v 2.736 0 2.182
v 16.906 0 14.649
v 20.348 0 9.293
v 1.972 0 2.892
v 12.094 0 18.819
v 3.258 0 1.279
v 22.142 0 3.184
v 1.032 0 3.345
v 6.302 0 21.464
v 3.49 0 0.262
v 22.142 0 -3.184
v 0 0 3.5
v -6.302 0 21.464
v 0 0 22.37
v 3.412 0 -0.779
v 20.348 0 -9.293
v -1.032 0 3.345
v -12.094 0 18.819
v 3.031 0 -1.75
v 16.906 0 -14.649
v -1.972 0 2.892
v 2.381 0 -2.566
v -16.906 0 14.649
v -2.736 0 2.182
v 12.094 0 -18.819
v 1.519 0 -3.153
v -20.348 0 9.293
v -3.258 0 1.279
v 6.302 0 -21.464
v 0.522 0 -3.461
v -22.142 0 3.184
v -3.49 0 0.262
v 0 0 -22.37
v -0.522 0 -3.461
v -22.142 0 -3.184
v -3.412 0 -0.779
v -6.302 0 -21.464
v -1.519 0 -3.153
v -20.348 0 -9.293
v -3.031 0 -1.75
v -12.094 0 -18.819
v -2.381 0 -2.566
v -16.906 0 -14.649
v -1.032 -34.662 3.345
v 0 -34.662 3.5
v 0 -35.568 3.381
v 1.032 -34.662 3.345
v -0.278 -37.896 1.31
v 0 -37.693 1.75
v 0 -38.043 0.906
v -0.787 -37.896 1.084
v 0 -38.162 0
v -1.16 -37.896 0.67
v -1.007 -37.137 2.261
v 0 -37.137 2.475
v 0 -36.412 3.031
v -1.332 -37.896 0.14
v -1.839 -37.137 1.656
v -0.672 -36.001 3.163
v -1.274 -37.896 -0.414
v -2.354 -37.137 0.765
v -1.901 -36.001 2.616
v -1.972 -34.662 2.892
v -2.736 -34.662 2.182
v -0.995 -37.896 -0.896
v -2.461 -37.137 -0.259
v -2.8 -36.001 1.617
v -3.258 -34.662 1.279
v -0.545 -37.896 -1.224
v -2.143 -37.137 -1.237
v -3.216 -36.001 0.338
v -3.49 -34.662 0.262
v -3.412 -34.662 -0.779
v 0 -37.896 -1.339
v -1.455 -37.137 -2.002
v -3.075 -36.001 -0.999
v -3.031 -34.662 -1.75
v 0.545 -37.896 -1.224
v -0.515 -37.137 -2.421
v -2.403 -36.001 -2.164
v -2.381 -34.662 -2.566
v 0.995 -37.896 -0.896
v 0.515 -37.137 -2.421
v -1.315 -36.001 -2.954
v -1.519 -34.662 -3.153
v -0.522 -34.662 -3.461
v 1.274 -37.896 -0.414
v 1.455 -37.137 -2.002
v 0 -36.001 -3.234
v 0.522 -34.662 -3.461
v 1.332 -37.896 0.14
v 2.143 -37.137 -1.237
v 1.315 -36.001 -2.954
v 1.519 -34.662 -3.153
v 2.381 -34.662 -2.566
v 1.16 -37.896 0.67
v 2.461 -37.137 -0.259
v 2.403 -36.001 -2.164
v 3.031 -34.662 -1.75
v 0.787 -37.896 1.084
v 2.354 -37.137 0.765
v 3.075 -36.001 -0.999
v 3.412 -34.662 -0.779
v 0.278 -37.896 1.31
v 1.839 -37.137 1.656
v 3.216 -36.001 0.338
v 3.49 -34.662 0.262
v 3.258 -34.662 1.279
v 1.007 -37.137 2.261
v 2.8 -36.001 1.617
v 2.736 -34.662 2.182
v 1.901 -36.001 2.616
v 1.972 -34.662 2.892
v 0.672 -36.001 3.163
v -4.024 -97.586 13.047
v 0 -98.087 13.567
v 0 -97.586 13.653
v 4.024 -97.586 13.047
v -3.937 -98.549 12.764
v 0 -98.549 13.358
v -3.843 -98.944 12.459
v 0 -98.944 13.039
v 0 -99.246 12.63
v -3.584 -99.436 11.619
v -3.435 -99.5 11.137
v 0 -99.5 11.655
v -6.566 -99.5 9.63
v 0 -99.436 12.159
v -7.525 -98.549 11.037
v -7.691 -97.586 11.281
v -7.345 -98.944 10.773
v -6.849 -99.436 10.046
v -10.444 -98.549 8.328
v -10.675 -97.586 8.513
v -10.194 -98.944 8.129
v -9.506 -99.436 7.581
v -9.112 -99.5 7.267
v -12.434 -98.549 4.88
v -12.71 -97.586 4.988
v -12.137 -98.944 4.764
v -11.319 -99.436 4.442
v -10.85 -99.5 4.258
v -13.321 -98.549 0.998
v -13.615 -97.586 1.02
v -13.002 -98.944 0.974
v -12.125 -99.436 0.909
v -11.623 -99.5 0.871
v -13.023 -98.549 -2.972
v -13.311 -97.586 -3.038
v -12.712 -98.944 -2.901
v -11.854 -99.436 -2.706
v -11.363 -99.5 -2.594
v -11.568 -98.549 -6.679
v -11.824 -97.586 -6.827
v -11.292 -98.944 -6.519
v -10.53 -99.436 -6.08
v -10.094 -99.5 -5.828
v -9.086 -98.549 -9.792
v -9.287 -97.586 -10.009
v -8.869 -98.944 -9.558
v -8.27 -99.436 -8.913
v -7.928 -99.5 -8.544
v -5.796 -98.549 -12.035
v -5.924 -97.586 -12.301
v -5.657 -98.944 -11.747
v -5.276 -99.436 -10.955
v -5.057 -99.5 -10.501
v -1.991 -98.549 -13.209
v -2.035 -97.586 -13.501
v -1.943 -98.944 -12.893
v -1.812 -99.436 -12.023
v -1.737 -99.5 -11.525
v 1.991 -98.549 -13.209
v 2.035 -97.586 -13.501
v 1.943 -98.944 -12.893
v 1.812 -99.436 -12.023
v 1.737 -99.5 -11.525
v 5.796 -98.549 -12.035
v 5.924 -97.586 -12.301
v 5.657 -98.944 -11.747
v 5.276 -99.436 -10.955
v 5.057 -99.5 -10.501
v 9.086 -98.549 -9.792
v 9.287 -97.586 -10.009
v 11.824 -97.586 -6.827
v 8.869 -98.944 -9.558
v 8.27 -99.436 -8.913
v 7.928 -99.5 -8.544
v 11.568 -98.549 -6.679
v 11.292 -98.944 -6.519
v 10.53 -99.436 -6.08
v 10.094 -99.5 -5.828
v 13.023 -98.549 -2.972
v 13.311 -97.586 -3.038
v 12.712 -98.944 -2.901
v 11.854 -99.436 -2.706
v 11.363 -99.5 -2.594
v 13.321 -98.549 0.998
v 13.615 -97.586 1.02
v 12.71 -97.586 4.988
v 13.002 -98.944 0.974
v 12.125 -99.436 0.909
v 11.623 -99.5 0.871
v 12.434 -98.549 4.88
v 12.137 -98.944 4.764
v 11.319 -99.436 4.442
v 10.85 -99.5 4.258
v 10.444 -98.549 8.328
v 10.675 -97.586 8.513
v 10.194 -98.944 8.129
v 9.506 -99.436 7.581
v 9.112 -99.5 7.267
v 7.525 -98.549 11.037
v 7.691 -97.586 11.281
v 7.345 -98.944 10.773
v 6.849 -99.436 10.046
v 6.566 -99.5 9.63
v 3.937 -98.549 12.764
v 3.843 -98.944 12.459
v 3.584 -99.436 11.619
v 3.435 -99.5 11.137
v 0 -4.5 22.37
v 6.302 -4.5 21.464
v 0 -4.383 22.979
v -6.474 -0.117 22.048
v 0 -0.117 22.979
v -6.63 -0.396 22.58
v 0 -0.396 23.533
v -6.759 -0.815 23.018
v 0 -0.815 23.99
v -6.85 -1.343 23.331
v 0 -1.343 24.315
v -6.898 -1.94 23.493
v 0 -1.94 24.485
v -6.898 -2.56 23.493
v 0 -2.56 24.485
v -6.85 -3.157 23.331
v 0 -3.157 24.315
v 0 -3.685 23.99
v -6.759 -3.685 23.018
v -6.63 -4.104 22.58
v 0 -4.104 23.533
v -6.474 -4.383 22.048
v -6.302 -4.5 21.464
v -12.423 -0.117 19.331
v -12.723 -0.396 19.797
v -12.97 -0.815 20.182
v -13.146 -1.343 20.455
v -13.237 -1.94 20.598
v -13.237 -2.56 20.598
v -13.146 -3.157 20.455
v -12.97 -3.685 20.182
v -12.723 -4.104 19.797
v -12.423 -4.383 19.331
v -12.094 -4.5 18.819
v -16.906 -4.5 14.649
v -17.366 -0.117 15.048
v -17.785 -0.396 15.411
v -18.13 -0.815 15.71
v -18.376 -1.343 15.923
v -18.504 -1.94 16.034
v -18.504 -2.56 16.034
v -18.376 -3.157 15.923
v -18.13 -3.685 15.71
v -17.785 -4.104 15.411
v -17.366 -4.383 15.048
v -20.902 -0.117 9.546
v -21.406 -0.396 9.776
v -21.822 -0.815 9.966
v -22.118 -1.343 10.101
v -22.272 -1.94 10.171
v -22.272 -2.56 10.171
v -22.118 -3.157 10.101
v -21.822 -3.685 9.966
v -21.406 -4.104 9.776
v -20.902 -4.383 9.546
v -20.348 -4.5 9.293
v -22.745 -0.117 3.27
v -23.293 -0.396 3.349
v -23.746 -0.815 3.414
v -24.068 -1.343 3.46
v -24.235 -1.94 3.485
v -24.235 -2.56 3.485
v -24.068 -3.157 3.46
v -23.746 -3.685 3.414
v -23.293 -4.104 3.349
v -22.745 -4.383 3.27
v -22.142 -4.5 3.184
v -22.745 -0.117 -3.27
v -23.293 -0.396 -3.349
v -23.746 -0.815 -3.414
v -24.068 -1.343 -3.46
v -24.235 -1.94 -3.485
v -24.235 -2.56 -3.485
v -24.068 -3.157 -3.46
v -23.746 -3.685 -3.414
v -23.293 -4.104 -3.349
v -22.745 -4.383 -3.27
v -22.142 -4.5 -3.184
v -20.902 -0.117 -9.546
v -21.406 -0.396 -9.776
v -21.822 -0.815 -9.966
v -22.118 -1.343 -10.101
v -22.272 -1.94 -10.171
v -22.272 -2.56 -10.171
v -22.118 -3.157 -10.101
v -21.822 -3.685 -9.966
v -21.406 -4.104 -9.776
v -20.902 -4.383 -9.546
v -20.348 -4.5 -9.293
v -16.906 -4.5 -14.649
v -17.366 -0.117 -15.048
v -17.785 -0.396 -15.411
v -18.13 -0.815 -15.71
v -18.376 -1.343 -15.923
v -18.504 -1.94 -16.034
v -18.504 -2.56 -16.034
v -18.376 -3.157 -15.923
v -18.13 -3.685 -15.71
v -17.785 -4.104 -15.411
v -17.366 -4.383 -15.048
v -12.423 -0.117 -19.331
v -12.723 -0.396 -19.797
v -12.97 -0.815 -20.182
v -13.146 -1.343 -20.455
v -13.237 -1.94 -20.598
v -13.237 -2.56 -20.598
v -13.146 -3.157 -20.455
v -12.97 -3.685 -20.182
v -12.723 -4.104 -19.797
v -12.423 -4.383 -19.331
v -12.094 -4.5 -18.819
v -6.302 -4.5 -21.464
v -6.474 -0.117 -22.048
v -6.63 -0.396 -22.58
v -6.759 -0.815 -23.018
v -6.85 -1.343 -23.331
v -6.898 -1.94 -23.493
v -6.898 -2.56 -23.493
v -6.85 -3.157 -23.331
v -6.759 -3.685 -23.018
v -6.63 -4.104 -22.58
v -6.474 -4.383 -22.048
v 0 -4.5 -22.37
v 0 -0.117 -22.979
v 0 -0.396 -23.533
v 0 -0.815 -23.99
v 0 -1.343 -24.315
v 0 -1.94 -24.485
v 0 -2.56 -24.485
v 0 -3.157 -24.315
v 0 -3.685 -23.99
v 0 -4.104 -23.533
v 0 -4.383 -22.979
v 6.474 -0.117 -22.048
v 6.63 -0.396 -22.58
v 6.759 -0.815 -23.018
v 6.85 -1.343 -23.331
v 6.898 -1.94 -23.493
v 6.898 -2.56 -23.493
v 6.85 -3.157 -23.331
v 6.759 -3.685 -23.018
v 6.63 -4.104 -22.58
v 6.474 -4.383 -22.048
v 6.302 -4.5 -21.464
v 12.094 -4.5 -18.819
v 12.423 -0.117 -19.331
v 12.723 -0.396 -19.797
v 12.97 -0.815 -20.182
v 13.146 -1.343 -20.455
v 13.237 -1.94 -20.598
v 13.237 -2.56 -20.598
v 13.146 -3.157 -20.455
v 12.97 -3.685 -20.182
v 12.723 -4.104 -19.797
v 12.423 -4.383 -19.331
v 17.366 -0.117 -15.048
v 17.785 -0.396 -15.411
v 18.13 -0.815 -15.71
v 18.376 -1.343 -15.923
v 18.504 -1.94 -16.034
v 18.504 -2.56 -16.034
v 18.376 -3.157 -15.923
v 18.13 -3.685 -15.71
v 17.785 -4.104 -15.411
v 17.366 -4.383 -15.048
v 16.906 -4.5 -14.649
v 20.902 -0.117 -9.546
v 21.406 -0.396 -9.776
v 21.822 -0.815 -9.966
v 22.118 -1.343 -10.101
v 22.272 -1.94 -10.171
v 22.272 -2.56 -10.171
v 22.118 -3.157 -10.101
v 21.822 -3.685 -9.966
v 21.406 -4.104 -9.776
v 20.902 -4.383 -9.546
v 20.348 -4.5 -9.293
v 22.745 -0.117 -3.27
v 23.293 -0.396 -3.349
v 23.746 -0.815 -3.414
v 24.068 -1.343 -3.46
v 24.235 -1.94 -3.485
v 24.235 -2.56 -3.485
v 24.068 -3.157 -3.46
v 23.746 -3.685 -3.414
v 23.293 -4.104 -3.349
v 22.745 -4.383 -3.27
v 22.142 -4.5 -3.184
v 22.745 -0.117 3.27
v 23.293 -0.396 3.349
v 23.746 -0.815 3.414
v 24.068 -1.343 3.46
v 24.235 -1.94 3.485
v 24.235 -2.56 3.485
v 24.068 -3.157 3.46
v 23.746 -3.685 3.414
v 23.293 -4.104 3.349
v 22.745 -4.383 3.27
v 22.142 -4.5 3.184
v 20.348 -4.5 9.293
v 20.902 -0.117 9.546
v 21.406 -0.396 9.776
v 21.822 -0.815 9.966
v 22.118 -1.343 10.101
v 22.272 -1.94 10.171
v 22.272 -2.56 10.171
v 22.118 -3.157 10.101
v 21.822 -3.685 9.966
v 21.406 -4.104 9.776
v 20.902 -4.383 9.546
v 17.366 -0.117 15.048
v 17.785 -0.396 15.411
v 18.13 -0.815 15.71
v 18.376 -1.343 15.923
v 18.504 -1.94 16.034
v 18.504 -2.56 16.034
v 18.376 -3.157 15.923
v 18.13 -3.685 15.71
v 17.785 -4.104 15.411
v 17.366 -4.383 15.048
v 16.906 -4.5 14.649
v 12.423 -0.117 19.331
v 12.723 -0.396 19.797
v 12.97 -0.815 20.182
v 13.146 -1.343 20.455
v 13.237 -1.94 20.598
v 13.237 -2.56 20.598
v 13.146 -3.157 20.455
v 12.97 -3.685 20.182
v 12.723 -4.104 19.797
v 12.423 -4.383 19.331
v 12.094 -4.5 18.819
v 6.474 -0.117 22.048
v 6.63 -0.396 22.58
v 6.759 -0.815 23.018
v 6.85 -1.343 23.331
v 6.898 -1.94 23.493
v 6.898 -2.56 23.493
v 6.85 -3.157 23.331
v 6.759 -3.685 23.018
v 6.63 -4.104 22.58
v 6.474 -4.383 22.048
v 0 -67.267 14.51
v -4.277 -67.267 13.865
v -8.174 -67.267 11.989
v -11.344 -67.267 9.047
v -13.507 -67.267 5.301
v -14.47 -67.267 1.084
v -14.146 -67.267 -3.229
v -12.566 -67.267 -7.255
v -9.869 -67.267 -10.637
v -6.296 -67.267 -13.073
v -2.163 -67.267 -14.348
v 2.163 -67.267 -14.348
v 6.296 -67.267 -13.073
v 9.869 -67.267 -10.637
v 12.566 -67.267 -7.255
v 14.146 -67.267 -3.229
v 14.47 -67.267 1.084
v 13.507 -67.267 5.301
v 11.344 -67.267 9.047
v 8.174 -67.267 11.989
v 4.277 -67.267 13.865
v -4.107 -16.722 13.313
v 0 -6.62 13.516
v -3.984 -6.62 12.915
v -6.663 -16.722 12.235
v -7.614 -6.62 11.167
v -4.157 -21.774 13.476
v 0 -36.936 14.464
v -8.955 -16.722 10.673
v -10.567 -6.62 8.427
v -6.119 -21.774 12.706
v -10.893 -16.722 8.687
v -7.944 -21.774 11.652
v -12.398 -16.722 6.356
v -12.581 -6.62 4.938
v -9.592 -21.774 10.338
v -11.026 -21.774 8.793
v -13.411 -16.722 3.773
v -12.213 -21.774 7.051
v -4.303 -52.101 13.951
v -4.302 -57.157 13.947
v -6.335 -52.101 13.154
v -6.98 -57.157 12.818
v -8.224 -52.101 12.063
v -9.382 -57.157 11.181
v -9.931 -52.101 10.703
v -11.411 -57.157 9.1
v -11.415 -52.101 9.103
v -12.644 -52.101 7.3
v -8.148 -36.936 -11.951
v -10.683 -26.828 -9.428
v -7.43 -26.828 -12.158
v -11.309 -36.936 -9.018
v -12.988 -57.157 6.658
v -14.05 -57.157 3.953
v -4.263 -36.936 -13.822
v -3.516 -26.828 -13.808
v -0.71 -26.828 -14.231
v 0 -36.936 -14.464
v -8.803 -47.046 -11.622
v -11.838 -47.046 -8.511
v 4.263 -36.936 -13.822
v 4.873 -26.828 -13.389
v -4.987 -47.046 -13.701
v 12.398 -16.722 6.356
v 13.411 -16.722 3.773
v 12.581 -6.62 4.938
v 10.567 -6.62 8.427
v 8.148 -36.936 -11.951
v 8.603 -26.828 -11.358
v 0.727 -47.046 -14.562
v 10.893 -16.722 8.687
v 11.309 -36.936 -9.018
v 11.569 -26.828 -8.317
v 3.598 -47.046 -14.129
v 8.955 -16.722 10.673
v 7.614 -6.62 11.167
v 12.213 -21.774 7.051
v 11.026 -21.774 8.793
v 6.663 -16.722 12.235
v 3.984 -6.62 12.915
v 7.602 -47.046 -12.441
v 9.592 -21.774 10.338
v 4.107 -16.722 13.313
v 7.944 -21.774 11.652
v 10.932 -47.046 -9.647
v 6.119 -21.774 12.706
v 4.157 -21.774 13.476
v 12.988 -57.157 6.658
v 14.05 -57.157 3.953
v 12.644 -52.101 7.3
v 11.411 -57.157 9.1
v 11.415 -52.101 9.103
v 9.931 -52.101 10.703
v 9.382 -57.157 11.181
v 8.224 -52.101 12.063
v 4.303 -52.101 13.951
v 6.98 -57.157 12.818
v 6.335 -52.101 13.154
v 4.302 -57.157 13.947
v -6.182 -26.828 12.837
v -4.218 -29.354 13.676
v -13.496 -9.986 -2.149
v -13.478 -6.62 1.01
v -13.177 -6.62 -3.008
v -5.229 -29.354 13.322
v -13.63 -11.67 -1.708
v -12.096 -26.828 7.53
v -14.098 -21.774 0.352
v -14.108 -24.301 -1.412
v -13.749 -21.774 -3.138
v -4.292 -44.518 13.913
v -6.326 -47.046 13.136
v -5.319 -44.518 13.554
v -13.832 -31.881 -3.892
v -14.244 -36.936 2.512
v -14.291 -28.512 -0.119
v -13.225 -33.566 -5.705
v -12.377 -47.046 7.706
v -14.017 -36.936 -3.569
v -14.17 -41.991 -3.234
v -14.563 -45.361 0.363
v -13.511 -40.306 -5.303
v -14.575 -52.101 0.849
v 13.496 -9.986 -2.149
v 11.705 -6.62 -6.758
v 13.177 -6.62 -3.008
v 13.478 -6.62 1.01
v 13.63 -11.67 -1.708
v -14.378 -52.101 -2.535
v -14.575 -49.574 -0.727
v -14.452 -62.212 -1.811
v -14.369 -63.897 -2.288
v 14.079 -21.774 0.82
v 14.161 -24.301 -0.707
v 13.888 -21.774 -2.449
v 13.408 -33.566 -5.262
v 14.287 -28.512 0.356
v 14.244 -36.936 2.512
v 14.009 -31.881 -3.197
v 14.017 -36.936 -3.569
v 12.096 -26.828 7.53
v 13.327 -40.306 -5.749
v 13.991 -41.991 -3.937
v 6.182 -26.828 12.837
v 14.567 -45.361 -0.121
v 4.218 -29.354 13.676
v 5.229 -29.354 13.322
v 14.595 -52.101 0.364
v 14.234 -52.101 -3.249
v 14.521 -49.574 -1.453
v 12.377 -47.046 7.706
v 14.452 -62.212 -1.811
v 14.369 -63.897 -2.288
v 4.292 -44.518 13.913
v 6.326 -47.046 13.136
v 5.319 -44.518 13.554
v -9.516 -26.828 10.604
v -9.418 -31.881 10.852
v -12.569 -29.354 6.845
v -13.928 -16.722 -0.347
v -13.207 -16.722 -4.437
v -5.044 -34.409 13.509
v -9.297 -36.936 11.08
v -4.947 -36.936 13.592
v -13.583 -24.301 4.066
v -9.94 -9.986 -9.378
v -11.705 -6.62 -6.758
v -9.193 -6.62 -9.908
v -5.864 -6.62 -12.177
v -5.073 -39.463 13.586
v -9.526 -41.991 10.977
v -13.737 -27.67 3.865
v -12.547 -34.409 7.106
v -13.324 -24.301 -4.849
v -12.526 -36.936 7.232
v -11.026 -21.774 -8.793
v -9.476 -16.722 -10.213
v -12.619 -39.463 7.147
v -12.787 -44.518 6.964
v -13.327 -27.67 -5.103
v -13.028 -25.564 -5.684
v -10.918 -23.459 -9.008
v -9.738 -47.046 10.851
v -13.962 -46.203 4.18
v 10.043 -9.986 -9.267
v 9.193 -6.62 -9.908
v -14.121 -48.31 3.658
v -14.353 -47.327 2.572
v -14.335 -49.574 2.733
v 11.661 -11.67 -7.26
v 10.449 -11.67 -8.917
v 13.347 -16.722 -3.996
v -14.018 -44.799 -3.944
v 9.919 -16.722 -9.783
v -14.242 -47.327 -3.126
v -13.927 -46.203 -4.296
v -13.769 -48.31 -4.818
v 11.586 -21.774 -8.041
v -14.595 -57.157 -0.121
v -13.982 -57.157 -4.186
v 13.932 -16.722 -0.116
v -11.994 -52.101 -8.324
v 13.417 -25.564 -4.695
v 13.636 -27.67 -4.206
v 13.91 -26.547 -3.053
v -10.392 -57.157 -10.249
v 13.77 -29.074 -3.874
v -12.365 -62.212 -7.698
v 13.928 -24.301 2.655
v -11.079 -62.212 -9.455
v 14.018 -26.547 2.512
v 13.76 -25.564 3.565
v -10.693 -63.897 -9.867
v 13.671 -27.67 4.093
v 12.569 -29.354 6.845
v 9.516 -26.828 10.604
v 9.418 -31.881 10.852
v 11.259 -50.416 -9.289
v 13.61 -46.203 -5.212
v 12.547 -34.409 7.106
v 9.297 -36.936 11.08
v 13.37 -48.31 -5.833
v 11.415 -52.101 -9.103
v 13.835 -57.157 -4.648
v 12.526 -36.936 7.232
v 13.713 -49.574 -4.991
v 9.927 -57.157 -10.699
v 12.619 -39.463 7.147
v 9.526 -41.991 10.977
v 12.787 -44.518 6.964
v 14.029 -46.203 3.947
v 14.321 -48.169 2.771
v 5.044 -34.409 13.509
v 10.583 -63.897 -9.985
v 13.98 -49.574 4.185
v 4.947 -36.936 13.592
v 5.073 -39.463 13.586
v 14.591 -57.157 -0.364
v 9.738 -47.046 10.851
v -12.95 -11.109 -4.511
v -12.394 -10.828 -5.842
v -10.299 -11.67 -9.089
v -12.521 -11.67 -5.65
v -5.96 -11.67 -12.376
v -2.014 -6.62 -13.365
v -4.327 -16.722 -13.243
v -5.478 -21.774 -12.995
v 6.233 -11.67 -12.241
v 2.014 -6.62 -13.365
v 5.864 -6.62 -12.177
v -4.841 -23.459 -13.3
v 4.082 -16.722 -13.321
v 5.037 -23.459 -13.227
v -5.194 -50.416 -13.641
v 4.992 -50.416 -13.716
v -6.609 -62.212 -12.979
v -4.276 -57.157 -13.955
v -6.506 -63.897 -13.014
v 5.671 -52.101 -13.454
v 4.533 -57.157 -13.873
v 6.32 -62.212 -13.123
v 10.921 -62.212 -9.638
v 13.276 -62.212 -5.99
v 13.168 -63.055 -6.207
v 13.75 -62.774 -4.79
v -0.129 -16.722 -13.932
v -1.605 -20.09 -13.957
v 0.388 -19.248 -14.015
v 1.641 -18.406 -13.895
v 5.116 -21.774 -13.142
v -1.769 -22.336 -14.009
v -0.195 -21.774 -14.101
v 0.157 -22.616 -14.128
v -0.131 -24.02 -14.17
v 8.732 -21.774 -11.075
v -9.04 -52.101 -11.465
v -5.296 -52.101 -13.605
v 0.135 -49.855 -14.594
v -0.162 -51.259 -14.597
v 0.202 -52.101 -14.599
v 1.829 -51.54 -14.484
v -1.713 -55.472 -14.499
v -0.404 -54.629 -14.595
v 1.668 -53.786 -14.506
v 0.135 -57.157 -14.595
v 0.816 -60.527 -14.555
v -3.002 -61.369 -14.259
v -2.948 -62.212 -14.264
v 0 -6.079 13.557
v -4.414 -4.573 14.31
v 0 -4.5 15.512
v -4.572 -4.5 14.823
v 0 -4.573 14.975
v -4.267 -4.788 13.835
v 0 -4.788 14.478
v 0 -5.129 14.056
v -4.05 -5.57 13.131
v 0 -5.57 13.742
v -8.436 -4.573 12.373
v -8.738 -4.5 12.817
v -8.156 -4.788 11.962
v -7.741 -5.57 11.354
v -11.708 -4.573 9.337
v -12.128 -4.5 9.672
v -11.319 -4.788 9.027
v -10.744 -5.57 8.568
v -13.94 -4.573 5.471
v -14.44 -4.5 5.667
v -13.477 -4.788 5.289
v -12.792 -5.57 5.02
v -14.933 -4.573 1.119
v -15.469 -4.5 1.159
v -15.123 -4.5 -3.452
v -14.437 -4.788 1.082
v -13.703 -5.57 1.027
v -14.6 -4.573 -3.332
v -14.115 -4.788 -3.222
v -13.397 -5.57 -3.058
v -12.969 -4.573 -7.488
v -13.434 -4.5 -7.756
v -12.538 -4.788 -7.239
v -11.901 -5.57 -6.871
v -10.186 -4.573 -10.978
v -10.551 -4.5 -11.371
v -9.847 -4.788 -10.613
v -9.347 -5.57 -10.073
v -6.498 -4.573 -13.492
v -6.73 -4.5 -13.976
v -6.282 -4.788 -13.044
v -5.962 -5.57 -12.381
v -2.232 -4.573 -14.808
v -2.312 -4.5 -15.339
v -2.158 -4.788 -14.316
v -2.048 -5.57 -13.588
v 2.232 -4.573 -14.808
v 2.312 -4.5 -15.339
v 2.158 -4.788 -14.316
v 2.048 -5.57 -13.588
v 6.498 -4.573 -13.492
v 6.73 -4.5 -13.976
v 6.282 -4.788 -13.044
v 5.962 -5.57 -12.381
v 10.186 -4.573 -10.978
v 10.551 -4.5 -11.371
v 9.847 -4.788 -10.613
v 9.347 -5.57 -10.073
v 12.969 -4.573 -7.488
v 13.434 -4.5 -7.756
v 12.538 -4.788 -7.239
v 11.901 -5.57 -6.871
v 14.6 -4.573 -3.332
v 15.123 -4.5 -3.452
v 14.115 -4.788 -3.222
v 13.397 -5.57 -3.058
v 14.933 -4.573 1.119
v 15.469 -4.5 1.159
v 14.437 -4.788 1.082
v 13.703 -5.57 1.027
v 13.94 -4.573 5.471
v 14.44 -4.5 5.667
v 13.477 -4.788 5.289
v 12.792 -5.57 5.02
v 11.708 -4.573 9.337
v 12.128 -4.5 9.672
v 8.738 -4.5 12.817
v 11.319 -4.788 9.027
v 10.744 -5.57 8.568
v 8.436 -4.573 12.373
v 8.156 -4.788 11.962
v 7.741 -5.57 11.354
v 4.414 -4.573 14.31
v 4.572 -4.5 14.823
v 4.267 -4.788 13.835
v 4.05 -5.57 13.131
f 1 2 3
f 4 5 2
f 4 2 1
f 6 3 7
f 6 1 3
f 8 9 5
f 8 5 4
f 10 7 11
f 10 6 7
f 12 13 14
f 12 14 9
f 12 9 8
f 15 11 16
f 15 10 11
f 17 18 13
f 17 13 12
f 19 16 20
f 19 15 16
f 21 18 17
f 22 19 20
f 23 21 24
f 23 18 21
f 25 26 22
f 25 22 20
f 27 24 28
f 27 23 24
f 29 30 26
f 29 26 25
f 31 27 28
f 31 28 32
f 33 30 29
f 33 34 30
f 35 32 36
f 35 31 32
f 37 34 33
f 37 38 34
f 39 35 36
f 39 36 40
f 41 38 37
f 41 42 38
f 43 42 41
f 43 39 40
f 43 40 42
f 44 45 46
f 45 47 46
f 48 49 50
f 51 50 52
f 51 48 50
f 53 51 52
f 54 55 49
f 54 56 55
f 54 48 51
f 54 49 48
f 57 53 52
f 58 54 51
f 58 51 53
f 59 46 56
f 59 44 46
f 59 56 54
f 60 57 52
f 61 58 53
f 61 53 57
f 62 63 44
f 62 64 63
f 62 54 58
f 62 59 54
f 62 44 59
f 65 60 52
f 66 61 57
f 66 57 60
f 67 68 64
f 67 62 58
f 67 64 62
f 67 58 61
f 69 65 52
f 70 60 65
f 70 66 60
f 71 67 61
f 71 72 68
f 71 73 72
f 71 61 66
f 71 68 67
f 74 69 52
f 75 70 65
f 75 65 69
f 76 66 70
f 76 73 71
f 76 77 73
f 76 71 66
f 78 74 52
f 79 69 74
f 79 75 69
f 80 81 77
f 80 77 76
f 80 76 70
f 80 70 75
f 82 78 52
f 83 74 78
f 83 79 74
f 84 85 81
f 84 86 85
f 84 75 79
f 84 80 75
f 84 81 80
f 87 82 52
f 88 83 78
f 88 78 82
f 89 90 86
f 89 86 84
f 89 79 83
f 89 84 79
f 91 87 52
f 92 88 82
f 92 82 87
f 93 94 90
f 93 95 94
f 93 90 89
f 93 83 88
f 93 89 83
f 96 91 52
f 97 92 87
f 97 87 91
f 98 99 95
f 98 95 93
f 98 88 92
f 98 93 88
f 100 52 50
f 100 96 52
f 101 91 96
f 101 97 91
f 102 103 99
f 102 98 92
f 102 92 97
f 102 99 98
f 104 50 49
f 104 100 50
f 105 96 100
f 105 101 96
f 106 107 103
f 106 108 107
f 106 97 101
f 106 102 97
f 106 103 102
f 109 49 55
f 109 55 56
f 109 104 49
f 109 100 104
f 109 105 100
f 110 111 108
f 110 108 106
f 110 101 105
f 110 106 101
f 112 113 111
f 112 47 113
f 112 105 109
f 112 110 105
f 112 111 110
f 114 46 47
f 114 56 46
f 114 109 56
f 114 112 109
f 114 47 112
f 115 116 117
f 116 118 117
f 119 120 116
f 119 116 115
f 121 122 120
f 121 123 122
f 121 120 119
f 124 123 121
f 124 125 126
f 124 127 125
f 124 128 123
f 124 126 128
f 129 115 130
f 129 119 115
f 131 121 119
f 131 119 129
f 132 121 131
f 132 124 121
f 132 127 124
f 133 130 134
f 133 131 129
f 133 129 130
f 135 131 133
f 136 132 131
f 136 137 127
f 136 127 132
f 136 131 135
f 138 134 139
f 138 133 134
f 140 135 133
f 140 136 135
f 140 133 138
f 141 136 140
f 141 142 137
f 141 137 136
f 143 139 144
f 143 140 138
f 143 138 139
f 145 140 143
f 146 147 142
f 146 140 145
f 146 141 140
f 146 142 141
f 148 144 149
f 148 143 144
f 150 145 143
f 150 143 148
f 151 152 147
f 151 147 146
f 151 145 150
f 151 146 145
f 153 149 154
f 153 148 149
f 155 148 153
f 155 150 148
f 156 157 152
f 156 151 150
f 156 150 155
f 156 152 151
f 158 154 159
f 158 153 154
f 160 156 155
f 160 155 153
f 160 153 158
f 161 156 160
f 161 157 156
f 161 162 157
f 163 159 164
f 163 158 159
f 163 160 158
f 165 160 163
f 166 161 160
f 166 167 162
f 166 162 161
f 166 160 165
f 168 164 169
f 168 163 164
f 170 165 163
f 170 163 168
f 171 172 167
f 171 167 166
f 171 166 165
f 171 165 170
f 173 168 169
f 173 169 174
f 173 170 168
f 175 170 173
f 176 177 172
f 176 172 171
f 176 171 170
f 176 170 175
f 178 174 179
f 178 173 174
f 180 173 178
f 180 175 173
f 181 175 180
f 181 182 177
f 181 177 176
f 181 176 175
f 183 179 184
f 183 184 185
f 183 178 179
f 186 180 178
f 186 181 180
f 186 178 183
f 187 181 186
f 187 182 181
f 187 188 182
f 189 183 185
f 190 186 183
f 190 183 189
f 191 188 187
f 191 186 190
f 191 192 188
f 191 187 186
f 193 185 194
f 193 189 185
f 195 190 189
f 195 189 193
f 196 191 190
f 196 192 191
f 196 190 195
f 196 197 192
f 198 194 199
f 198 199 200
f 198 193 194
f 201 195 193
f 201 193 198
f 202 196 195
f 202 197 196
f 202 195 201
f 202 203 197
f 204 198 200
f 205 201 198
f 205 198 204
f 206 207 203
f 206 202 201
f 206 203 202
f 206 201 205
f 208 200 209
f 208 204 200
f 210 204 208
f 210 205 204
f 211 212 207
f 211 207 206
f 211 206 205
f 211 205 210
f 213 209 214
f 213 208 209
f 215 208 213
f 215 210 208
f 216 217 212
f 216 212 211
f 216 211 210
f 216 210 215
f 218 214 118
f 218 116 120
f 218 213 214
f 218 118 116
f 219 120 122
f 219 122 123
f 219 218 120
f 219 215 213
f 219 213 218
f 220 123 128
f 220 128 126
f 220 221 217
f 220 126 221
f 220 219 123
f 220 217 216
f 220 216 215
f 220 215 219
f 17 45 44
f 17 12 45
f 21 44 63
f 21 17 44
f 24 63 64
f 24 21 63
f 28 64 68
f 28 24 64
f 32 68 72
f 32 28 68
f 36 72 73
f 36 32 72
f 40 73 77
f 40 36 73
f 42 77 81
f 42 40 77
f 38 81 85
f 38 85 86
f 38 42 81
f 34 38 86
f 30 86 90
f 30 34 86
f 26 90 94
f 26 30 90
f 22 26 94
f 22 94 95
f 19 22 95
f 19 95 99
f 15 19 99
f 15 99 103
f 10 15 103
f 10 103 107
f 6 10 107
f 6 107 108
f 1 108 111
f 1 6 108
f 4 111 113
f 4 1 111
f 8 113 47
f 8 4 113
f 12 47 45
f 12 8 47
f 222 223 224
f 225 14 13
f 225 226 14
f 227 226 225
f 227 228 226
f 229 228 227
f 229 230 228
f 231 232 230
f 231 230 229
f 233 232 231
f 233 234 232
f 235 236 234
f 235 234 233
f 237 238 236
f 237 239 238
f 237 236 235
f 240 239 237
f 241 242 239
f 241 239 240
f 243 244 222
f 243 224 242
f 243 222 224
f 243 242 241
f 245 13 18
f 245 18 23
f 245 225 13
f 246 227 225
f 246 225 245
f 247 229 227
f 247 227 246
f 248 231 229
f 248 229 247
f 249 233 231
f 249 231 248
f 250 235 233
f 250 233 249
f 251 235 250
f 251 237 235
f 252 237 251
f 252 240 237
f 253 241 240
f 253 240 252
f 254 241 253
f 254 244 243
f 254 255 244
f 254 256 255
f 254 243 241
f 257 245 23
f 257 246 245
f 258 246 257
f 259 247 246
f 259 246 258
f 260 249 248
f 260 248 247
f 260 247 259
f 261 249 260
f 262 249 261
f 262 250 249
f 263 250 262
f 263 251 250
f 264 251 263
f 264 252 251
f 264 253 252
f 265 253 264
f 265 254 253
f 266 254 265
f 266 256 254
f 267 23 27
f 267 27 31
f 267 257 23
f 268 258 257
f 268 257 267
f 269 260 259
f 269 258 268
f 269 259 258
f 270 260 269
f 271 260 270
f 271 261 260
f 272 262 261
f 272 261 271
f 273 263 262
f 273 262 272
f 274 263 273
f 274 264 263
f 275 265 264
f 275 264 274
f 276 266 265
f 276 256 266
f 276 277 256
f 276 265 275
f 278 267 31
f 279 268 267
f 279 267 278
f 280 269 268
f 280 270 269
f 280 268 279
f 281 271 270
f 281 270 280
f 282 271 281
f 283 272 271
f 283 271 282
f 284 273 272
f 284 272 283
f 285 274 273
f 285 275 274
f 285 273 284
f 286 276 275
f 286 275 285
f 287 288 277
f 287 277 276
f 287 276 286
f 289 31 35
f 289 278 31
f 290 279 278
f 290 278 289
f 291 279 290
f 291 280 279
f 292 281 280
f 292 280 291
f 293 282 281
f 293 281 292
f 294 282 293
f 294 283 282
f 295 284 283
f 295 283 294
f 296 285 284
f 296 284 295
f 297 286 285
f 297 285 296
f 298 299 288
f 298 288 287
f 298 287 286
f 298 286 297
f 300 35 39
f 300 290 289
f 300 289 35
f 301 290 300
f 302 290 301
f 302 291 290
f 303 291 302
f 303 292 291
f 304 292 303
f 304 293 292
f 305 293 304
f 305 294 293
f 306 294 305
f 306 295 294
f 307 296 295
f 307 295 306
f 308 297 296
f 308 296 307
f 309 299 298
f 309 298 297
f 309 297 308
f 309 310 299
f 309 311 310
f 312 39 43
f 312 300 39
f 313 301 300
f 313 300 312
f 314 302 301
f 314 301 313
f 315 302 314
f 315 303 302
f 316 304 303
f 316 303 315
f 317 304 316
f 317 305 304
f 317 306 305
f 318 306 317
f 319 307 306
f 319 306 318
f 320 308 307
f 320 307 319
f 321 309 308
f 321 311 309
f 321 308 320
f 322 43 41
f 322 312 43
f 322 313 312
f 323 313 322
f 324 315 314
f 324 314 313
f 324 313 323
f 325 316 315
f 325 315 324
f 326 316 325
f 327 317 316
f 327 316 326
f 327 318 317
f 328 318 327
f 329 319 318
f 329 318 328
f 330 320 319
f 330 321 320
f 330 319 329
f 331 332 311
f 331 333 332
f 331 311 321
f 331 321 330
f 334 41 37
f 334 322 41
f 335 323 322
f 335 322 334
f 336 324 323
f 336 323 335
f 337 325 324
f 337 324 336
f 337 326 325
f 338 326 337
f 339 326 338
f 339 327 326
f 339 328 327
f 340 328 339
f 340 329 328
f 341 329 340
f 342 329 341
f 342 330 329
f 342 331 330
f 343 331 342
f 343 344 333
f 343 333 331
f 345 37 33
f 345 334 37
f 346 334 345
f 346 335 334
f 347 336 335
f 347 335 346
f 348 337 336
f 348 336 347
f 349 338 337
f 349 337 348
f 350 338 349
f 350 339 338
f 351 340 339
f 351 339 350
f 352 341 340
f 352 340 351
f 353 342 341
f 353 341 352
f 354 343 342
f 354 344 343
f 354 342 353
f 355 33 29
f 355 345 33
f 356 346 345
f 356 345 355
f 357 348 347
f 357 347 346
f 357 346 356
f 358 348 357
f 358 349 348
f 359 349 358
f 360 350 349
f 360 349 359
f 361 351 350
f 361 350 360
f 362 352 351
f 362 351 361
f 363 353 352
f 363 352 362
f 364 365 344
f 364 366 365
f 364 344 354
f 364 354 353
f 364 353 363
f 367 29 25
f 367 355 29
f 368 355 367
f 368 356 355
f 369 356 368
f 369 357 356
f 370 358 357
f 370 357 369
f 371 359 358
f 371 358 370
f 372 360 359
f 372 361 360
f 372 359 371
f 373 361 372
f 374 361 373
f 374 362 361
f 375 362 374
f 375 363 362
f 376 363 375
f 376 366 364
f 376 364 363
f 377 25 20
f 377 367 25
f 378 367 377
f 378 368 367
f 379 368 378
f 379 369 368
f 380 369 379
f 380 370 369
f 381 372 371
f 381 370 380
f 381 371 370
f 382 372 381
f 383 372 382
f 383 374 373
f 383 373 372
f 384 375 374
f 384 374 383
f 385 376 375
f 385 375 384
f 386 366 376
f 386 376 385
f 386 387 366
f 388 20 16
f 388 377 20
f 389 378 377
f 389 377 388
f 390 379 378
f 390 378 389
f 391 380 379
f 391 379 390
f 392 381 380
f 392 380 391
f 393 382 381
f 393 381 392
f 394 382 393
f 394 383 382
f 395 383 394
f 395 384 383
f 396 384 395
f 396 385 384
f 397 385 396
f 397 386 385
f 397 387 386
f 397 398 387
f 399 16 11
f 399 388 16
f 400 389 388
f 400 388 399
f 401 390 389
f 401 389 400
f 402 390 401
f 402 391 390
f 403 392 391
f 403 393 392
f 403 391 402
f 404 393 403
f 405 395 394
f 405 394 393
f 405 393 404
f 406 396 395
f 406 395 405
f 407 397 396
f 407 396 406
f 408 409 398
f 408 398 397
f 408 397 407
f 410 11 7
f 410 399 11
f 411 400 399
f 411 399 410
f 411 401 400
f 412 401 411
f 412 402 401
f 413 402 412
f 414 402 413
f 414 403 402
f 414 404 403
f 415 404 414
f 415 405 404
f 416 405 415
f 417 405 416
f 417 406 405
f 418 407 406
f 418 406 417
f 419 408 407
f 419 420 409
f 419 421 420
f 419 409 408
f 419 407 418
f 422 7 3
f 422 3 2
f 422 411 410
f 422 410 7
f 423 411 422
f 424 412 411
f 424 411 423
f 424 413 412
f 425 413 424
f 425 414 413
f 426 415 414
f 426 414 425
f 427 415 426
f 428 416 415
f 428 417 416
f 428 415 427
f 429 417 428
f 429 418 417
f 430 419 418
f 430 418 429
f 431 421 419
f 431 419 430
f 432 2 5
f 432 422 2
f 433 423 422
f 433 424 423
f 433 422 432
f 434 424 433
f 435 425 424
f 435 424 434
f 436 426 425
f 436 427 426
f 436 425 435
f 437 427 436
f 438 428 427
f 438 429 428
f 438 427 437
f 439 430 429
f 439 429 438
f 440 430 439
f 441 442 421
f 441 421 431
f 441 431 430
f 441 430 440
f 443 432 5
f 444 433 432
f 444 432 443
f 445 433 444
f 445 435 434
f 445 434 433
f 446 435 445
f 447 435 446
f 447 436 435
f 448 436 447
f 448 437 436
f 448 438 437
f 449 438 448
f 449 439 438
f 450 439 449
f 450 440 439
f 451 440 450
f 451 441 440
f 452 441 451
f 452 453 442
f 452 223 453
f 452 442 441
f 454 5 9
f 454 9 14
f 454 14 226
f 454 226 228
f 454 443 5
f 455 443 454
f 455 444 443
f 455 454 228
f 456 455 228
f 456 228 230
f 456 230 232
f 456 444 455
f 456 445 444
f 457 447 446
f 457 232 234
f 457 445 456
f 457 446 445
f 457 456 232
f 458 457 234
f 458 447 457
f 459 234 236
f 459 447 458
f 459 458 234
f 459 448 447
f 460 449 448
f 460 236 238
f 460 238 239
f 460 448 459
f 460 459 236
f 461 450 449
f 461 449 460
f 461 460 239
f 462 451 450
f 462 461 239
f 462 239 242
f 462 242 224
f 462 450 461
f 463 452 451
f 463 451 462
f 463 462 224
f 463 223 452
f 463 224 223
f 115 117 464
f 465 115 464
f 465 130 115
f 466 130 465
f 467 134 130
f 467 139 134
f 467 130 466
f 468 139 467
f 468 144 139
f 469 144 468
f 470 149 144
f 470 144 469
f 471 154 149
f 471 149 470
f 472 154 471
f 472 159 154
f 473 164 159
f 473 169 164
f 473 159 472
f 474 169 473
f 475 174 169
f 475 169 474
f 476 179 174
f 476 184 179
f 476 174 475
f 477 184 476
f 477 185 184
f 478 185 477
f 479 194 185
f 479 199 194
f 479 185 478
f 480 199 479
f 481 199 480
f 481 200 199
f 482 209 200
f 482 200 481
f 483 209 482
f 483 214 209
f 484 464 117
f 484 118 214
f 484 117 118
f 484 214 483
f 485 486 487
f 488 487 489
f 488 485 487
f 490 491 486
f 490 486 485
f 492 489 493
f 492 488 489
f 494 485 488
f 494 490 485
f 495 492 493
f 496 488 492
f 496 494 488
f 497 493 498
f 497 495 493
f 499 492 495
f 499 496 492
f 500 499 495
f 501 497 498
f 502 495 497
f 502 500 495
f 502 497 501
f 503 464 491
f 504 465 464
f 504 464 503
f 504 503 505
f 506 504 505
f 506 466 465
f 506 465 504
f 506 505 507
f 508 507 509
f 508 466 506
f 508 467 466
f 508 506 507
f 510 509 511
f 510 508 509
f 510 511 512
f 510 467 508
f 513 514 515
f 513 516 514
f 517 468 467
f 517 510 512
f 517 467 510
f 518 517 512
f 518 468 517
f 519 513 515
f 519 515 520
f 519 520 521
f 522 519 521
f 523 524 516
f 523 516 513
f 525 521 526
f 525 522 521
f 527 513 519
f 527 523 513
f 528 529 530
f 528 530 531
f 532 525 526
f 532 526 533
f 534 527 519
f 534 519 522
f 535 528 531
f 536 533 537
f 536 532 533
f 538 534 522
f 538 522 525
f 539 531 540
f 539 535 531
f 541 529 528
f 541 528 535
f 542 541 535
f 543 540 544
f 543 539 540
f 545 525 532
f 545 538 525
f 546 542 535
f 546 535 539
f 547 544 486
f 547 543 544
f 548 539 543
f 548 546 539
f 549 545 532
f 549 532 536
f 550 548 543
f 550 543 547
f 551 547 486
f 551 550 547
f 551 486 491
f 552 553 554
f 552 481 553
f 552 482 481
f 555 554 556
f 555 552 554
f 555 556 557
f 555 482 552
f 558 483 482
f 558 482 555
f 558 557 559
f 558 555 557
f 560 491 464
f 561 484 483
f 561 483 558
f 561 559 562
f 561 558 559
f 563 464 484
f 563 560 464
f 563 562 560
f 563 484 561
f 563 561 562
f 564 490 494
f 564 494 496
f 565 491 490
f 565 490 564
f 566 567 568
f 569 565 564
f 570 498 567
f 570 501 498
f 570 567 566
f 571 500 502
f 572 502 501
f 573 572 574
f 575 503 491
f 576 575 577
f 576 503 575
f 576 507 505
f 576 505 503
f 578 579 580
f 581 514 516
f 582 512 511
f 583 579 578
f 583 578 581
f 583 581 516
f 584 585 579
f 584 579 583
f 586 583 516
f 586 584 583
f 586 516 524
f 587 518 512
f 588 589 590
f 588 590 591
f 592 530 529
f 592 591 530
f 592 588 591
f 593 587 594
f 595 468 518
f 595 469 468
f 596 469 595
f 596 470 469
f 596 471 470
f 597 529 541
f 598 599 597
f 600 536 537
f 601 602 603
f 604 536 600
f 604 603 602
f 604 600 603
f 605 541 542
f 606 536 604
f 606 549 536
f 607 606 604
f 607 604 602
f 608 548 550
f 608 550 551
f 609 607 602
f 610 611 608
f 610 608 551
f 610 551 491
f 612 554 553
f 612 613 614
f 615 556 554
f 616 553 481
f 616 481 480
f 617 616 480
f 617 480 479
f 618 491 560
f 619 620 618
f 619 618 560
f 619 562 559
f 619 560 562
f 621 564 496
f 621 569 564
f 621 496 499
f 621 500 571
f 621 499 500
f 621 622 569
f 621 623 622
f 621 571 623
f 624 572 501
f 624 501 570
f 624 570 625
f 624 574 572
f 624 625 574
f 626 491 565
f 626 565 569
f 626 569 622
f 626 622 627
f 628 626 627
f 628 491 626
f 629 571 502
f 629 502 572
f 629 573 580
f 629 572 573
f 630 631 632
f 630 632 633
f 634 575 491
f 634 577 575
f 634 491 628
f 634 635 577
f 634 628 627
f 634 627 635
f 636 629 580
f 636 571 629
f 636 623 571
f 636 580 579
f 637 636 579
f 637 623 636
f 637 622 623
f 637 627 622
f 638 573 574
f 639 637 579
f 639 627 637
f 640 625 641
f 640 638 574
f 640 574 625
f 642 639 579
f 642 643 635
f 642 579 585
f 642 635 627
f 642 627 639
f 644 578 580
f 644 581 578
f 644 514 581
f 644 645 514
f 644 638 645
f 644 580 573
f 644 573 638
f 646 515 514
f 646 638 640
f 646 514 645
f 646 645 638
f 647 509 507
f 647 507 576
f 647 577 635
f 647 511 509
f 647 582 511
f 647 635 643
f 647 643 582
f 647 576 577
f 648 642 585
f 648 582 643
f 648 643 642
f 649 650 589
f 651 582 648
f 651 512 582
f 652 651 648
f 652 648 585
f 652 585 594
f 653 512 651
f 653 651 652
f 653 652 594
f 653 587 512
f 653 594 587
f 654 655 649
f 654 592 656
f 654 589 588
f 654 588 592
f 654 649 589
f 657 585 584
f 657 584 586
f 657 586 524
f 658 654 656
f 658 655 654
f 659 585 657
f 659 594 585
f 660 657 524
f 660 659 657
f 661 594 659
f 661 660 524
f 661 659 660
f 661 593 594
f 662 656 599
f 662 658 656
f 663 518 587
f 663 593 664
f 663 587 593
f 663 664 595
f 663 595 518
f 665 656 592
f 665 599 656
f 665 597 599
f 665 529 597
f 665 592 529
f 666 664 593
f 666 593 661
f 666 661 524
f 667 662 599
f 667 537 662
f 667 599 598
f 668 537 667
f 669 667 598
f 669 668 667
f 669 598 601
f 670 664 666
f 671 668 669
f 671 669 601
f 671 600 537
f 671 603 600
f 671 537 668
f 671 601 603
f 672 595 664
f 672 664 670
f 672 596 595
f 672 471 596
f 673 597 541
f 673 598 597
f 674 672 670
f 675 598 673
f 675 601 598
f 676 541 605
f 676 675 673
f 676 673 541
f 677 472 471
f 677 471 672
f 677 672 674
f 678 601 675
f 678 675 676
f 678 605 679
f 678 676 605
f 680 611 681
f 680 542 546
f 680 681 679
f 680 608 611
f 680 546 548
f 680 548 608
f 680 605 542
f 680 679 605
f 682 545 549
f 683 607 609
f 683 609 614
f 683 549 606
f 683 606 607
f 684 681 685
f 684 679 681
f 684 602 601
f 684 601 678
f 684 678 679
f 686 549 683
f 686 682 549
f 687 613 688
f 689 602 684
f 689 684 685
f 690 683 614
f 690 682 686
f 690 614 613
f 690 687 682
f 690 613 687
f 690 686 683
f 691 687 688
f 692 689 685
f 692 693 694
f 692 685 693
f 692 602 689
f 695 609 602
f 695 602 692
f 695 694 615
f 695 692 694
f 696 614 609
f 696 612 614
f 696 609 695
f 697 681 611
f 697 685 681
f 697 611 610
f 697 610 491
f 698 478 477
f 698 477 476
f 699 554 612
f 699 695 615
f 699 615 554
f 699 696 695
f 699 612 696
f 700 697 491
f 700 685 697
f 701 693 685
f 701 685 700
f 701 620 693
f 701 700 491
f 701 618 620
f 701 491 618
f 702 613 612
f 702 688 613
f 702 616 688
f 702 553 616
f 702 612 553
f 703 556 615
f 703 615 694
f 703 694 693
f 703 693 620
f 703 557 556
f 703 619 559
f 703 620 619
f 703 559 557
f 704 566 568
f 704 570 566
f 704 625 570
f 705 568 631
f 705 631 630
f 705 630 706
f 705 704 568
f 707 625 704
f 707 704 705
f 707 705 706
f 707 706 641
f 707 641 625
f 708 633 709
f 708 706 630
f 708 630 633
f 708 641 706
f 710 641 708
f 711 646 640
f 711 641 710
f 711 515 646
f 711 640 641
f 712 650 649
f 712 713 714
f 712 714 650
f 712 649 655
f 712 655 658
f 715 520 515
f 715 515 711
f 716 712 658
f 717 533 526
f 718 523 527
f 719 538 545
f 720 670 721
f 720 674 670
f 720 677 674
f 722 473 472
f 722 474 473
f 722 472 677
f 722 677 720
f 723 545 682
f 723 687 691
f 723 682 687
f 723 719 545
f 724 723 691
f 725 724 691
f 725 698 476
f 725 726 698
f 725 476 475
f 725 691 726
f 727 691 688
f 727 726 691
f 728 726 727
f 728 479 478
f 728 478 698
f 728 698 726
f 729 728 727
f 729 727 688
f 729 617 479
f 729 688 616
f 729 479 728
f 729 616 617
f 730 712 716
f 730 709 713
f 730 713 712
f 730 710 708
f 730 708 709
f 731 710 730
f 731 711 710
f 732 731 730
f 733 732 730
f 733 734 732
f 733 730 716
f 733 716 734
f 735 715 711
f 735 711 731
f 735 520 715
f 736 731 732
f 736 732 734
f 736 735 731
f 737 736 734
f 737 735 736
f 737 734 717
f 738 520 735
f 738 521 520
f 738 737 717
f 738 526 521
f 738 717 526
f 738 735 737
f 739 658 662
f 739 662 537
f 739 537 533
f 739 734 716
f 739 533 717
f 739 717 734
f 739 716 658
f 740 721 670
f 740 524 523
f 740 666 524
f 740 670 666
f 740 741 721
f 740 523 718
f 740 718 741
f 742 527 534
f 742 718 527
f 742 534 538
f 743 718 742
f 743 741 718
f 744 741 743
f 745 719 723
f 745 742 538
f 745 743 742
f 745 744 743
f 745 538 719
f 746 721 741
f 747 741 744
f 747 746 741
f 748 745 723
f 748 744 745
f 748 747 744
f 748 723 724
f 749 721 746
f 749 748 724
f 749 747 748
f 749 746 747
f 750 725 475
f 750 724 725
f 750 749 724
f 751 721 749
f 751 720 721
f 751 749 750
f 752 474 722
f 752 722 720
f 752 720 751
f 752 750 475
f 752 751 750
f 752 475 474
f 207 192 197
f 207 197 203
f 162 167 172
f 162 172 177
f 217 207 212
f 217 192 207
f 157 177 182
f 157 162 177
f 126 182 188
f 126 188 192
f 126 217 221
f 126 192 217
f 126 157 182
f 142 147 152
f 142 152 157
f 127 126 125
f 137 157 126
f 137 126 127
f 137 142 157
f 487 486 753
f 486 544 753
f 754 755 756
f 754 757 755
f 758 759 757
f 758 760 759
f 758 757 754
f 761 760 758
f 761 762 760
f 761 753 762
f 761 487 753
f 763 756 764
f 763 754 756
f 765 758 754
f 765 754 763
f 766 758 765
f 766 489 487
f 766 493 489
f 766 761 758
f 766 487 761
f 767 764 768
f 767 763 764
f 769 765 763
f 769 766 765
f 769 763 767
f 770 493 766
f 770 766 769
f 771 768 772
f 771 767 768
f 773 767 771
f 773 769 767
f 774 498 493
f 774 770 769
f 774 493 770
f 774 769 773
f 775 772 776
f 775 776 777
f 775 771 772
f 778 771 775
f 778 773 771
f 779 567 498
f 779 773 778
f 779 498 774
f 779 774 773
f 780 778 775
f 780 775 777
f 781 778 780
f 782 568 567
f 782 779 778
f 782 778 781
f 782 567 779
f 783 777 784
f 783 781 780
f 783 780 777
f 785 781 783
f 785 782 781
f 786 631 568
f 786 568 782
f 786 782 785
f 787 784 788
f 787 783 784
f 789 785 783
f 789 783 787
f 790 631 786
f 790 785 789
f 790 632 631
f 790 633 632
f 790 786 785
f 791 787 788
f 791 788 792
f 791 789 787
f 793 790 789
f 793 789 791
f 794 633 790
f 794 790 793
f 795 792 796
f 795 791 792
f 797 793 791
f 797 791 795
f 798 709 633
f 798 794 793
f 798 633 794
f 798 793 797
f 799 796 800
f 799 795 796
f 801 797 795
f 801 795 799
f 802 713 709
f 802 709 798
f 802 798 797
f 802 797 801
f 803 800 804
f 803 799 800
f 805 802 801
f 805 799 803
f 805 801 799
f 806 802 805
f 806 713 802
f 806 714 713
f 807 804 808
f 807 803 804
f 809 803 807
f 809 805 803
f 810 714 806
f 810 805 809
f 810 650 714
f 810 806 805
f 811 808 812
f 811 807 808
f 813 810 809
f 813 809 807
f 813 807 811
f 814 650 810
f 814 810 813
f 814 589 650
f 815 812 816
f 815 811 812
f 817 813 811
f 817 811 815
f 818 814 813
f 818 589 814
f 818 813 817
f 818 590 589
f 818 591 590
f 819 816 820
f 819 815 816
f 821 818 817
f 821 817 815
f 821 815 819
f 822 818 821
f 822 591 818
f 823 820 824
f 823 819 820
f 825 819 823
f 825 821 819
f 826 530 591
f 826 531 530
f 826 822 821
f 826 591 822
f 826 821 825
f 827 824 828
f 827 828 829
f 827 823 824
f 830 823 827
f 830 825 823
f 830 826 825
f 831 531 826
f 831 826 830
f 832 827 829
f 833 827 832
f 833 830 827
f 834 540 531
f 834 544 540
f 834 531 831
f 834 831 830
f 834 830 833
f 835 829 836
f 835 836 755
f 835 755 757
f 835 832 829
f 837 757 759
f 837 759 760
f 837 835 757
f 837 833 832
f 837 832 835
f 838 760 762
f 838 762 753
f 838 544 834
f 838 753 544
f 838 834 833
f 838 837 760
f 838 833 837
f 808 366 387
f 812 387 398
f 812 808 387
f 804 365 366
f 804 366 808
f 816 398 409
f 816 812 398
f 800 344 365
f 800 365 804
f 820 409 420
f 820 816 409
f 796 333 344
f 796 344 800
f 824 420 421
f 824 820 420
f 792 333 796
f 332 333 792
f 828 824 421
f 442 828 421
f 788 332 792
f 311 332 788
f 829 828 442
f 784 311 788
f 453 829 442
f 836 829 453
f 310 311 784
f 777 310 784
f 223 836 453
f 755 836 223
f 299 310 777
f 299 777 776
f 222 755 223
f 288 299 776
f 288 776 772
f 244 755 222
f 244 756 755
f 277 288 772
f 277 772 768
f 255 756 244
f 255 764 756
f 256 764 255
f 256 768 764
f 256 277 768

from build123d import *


# Not quite as in the source:
# - a feature names something its author has since deleted; it is built from what else it names


with BuildPart() as f1:
    # F0 (on Right) → F1 (revolve)
    with BuildSketch(Plane.YZ):
        with BuildLine():
            Line((-4.49999996, 22.3697591573), (-4.49999996, 15.5121270956))
            ThreePointArc((-4.49999996, 15.5121270956), (-5.128710844, 14.0562541066), (-6.6195661202, 13.5157043114))
            ThreePointArc((-6.6195661202, 13.5157043114), (-52.1013620917, 14.6000076136), (-97.5862327976, 13.6534267626))
            ThreePointArc((-97.5862327976, 13.6534267626), (-98.9443797276, 13.038676402), (-99.5, 11.6552866512))
            Line((-99.5, 11.6552866512), (-99.5, 0))
            Line((-99.5, 0), (-38.1620294721, 0))
            ThreePointArc((-38.1620294721, 0), (-37.1369032063, 2.4748737342), (-34.6620294721, 3.5))
            Line((-34.6620294721, 3.5), (0, 3.5))
            Line((0, 3.5), (0, 22.3697591573))
            ThreePointArc((0, 22.3697591573), (-2.24999998, 24.5060521618), (-4.49999996, 22.3697591573))
        make_face()
    revolve(axis=Axis((0, -59.5094561577, 0), (0, -1, 0)))


solid = f1.part
